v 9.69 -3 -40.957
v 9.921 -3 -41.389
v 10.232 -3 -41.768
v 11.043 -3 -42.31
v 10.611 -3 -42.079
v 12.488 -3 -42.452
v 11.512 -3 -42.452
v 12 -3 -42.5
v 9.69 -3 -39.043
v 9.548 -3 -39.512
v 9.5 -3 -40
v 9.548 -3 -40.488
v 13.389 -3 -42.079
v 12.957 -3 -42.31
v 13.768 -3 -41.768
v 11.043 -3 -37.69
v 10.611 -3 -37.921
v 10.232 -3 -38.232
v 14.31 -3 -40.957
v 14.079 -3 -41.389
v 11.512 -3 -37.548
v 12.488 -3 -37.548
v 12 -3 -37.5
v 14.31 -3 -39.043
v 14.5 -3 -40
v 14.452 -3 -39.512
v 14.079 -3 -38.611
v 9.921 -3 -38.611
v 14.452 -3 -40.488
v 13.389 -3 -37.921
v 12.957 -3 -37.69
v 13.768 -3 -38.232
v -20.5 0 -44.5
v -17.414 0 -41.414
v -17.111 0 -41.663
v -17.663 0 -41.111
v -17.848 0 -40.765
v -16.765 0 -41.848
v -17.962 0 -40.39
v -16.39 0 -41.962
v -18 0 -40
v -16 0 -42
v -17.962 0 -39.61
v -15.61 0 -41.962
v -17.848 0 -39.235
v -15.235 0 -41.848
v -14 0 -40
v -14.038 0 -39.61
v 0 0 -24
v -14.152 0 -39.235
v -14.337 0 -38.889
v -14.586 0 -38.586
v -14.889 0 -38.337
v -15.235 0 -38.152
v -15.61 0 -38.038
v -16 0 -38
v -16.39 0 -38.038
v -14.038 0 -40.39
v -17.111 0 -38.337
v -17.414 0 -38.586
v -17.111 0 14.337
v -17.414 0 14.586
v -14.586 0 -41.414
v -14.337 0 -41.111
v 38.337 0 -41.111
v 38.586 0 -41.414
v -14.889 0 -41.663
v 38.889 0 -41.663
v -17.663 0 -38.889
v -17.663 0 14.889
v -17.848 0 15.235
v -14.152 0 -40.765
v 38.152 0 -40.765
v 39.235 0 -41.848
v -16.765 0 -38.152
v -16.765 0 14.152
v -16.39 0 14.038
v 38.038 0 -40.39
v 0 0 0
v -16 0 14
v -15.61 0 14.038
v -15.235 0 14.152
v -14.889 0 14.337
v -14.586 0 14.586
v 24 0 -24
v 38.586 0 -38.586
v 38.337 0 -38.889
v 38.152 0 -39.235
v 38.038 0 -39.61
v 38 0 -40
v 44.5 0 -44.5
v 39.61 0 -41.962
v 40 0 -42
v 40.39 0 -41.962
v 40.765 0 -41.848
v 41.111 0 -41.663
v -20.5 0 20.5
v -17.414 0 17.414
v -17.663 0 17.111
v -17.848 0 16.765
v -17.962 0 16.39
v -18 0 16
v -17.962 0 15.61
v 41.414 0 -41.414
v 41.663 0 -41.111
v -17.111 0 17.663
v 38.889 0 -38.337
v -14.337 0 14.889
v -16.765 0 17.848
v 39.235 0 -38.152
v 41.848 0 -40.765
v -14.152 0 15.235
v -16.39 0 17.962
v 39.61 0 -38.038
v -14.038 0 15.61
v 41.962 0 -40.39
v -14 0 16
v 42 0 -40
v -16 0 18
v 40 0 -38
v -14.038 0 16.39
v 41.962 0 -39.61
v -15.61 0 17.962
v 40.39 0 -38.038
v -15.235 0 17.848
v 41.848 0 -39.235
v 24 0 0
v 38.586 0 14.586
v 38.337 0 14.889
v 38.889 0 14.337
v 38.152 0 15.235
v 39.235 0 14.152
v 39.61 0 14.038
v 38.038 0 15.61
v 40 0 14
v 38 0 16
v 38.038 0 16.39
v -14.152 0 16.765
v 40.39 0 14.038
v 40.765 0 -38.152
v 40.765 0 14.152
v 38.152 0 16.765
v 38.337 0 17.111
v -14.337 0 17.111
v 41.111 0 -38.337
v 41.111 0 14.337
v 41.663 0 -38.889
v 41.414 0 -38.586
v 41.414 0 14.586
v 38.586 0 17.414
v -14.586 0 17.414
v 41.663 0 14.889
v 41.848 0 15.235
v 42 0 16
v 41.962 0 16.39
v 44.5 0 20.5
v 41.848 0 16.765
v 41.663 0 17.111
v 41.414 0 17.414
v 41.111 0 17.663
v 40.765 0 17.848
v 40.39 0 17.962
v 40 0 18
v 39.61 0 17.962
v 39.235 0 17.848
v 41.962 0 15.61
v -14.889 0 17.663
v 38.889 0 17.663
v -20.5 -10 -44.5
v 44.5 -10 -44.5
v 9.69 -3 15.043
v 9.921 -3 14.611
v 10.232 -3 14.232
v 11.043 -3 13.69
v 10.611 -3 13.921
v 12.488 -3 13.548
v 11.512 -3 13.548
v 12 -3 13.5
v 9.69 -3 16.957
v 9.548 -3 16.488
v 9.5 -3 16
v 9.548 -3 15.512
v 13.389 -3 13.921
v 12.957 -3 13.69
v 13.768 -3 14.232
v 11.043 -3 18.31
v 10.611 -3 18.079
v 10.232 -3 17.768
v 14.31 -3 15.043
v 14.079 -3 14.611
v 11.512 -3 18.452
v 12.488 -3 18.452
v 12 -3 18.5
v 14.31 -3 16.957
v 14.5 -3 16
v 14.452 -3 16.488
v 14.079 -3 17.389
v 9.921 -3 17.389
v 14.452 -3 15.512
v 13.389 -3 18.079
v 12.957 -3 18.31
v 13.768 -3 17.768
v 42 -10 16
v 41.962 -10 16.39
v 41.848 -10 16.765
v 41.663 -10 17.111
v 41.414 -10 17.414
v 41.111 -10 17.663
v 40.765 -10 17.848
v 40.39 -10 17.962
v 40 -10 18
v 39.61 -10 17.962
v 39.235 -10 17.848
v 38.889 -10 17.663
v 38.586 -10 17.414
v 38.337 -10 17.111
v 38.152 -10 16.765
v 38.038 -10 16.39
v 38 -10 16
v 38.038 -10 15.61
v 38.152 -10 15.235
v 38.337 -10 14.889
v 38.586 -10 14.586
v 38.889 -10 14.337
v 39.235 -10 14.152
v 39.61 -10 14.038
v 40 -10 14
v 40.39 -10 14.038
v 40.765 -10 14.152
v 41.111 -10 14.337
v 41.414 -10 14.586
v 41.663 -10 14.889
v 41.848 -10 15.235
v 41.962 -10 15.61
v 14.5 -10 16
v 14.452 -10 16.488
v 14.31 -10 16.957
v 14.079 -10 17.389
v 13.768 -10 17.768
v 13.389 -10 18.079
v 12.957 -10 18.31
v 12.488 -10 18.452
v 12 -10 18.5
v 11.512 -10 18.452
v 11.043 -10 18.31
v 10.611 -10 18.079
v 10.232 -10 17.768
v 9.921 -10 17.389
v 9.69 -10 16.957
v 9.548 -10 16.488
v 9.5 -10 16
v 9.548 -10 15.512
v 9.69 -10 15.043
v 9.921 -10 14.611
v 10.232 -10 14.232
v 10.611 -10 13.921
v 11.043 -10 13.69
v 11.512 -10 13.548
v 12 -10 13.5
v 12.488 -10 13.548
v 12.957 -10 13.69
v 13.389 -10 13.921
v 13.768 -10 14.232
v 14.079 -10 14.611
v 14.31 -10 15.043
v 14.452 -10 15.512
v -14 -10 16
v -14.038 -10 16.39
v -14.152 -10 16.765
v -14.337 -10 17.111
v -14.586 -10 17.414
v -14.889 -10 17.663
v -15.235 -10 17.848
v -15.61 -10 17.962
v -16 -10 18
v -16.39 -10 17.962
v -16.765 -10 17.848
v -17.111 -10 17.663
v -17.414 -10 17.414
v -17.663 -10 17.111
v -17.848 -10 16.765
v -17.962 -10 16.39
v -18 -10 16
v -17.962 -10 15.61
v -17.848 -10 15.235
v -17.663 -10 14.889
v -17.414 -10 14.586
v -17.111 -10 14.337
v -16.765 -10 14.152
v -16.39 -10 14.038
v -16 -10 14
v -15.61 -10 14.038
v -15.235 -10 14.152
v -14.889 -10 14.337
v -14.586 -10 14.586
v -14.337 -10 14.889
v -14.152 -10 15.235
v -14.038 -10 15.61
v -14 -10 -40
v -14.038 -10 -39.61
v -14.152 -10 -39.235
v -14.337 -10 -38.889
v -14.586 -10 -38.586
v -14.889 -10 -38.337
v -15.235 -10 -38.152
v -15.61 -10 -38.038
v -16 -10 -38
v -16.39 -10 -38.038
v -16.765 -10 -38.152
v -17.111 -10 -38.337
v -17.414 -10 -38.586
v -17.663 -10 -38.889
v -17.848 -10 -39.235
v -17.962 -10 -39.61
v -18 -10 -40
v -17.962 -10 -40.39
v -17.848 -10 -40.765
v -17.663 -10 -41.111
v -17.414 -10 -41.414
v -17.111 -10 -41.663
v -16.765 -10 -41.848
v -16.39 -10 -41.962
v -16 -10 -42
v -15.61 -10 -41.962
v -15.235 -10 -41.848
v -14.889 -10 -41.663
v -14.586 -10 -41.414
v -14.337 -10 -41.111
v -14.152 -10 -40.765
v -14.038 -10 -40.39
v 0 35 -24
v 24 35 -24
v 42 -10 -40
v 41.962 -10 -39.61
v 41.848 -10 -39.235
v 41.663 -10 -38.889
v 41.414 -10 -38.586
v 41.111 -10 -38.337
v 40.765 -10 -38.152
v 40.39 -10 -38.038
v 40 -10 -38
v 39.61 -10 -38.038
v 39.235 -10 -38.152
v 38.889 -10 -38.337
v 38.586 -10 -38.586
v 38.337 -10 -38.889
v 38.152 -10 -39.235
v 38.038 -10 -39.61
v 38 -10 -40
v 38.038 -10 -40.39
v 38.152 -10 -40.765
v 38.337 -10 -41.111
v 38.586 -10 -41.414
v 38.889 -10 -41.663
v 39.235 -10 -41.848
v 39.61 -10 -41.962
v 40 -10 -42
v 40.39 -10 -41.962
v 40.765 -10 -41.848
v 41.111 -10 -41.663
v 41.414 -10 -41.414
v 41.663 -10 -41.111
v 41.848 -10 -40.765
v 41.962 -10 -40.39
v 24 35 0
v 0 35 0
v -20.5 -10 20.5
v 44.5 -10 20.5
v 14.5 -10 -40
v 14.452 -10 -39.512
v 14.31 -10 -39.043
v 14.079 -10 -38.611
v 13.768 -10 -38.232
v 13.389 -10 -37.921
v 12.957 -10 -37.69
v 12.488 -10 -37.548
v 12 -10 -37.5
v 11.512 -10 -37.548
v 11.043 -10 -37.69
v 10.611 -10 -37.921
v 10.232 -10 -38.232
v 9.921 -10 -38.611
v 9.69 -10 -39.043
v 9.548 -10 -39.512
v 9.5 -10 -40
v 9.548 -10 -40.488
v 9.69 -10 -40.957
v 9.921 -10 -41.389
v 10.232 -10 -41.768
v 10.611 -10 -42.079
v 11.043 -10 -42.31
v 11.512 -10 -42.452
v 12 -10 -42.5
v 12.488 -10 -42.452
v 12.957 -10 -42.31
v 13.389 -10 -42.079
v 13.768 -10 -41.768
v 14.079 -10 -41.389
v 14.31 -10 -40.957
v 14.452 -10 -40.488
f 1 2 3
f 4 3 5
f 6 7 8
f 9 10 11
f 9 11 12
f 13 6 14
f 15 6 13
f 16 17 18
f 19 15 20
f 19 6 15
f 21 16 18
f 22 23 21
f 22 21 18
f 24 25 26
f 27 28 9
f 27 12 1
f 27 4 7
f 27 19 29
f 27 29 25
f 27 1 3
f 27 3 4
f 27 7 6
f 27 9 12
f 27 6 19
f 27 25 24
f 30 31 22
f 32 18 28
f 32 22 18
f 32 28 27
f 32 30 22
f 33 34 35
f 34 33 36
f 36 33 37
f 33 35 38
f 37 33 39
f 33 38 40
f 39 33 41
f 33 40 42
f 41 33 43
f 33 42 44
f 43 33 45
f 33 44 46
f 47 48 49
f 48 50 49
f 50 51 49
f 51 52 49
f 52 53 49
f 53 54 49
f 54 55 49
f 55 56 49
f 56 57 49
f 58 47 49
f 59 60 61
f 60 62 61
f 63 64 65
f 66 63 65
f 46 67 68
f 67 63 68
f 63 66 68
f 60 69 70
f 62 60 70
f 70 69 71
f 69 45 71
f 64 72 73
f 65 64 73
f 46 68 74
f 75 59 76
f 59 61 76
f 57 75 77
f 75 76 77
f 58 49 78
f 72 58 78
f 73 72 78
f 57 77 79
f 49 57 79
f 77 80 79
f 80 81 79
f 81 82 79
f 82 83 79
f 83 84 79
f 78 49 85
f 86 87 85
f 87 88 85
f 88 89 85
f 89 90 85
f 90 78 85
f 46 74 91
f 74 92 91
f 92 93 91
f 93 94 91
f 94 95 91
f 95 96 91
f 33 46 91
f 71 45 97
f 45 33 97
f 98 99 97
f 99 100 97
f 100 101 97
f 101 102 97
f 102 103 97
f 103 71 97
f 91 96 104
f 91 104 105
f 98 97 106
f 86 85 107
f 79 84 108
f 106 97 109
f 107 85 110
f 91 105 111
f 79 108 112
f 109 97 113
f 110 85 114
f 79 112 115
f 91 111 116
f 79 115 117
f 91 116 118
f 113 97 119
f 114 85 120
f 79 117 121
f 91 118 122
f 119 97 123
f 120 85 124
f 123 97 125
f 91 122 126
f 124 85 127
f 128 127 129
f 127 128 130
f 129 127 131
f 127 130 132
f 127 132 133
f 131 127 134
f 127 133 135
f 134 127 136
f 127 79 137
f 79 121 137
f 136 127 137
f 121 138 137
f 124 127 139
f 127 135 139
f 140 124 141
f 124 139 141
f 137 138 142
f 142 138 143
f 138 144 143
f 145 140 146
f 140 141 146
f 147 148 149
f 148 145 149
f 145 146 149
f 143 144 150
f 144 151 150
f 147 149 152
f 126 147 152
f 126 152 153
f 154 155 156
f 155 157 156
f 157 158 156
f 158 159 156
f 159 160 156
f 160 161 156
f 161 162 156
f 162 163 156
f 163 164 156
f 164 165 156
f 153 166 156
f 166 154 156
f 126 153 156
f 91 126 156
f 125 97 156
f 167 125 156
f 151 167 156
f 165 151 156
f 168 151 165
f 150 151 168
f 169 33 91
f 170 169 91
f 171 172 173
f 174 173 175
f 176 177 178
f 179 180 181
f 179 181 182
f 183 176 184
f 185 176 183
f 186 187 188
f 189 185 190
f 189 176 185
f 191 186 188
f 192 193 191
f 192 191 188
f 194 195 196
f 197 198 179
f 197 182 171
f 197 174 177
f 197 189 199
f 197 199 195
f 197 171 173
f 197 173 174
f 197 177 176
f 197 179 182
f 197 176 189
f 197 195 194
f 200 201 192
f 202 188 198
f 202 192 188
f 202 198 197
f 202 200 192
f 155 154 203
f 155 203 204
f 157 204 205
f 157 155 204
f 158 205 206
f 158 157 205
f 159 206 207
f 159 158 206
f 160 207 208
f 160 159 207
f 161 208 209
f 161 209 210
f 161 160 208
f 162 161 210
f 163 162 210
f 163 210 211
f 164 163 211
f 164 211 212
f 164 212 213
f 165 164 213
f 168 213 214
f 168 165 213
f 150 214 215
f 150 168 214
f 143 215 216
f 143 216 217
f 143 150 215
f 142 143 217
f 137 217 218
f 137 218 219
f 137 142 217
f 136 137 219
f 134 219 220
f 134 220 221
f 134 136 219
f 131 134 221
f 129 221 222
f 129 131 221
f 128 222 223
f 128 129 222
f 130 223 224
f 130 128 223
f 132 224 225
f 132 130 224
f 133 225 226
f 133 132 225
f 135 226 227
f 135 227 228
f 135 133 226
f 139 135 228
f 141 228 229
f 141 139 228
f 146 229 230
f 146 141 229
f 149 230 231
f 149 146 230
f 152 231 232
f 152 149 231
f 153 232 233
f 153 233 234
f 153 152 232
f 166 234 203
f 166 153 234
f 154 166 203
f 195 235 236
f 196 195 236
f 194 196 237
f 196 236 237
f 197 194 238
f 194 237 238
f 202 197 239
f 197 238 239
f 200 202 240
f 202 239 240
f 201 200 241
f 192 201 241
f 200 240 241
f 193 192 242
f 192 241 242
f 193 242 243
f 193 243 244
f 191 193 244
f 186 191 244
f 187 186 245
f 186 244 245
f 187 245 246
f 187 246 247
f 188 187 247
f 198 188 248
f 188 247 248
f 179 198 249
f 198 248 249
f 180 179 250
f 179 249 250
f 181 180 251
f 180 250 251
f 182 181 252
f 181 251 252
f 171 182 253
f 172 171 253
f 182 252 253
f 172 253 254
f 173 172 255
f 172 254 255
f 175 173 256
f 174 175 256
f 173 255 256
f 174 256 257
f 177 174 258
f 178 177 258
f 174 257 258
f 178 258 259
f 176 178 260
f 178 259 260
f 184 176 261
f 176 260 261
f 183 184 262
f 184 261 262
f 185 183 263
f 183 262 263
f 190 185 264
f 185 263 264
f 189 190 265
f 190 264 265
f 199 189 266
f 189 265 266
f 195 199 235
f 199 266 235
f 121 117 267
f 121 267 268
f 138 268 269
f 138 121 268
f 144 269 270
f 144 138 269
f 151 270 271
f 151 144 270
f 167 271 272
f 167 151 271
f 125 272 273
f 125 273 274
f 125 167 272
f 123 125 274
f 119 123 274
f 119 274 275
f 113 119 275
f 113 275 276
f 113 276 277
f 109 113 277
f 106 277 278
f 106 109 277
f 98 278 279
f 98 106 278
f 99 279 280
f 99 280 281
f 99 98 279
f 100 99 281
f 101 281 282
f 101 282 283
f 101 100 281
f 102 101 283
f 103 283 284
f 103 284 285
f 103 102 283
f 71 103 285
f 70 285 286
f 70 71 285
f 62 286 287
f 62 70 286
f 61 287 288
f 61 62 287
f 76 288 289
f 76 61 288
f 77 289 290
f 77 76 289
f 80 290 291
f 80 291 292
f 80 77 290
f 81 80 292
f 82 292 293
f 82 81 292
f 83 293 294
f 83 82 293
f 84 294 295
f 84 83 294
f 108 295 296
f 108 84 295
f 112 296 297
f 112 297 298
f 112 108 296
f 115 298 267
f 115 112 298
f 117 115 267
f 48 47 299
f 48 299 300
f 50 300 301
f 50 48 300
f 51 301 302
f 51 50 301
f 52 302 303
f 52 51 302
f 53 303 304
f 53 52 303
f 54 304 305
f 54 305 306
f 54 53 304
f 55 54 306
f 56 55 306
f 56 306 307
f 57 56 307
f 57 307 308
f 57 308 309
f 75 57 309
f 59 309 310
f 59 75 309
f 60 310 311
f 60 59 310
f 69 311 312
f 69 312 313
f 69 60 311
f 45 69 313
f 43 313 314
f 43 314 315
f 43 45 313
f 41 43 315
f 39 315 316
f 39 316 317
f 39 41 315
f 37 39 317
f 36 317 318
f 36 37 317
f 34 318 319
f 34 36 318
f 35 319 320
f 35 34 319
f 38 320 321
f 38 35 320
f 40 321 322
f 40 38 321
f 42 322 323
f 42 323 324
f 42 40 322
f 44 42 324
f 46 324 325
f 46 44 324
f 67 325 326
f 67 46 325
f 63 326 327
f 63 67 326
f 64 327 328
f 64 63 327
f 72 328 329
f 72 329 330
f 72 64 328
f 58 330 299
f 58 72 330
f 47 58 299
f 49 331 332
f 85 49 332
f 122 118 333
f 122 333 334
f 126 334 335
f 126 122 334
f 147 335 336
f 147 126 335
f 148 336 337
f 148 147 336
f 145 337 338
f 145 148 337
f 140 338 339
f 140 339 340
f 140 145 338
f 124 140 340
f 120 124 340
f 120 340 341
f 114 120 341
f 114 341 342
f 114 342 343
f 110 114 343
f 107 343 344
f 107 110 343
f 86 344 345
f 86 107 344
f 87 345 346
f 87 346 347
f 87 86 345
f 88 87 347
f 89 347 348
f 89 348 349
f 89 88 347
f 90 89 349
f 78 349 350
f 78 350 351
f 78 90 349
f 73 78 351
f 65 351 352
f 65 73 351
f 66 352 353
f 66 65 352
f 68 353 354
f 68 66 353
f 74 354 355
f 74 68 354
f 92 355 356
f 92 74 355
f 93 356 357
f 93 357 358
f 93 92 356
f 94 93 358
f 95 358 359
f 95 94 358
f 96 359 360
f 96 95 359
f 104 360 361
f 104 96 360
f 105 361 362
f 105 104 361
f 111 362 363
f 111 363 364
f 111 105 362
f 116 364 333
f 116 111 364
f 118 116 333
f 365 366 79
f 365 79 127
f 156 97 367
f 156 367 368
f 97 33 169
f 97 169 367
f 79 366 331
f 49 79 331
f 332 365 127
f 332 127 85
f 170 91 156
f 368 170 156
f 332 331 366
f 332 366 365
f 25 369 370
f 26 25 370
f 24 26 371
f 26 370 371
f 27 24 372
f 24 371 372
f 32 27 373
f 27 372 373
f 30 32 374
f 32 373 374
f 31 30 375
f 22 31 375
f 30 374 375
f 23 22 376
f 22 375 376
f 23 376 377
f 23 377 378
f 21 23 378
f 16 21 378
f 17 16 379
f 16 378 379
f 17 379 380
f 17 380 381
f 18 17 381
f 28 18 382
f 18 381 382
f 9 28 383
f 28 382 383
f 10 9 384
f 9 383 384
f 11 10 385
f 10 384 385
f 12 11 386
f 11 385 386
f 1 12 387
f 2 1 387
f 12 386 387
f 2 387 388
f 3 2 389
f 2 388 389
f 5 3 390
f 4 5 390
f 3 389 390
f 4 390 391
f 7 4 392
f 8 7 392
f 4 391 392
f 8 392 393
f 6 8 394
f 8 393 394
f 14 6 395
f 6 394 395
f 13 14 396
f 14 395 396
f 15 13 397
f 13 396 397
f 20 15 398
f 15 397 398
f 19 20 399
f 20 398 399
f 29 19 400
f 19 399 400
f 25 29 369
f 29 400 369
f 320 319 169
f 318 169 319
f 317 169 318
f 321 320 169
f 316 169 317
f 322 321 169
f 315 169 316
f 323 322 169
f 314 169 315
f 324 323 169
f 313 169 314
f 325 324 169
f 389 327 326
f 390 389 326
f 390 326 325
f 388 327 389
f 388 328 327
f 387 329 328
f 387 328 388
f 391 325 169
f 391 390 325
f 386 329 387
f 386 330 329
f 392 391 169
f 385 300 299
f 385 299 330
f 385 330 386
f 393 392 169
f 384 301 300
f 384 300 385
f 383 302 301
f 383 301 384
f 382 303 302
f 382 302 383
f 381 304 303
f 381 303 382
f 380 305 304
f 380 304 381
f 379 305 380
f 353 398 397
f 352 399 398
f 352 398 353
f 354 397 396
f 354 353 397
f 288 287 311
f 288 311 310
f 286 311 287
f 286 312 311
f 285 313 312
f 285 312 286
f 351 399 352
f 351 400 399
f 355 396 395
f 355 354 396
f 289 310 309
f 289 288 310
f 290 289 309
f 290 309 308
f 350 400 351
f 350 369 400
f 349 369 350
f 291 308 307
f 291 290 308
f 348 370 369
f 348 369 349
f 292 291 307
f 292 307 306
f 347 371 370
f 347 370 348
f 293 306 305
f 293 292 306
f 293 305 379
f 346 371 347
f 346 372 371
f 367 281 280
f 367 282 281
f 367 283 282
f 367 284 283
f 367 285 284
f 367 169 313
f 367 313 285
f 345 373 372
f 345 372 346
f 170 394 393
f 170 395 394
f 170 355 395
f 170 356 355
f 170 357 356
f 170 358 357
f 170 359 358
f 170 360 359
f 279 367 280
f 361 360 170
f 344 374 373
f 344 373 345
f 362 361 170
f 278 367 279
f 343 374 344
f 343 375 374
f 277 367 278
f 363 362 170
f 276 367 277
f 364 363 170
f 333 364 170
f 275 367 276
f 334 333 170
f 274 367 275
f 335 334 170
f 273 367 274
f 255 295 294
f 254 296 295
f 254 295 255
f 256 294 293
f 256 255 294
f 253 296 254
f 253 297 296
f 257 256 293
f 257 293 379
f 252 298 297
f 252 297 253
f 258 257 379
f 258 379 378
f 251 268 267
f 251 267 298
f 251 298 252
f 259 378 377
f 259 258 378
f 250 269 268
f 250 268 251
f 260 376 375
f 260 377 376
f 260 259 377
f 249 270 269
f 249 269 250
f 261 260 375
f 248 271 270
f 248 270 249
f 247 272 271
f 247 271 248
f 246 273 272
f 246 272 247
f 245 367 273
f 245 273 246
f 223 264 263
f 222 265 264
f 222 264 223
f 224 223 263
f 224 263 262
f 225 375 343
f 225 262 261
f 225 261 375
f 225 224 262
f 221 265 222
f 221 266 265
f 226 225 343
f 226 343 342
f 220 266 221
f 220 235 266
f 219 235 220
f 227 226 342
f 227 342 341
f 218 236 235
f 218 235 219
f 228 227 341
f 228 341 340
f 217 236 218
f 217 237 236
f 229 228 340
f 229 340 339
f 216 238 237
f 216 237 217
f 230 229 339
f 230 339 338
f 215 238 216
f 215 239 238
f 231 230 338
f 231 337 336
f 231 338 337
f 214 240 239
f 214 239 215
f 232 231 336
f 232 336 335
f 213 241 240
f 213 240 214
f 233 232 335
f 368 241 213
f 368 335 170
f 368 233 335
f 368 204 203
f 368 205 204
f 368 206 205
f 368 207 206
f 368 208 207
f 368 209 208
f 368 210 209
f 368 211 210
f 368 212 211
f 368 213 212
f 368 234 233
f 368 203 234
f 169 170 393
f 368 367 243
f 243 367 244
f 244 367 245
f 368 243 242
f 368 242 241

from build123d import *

# Parameters (mm, degrees)
SKETCH1_W           = 24
SKETCH1_H           = 24
BOSS_EXTRUDE1_DEPTH = 35
SKETCH2_W           = 65
SKETCH2_H           = 65
SKETCH2_R           = 2
BOSS_EXTRUDE2_DEPTH = 10
SKETCH3_R           = 2.5
CUT_EXTRUDE1_DEPTH  = 7


with BuildPart() as part:
    # Sketch1 → Boss-Extrude1 (new body)
    with BuildSketch(Plane(origin=(0, 0, 0), x_dir=(1, 0, 0), z_dir=(0, 1, 0))):
        with Locations((12, 12)):
            Rectangle(SKETCH1_W, SKETCH1_H)
    extrude(amount=BOSS_EXTRUDE1_DEPTH)

    # Sketch2 → Boss-Extrude2 (add)
    with BuildSketch(Plane.XZ):
        with Locations((12, -12)):
            Rectangle(SKETCH2_W, SKETCH2_H)
        with Locations((-16, 16)):
            Circle(SKETCH2_R, mode=Mode.SUBTRACT)
        with Locations((-16, -40)):
            Circle(SKETCH2_R, mode=Mode.SUBTRACT)
        with Locations((40, 16)):
            Circle(SKETCH2_R, mode=Mode.SUBTRACT)
        with Locations((40, -40)):
            Circle(SKETCH2_R, mode=Mode.SUBTRACT)
    extrude(amount=BOSS_EXTRUDE2_DEPTH)

    # Sketch3 → Cut-Extrude1 (cut)
    with BuildSketch(Plane.XZ.offset(10)):
        with Locations((12, 16)):
            Circle(SKETCH3_R)
        with Locations((12, -40)):
            Circle(SKETCH3_R)
    extrude(amount=-CUT_EXTRUDE1_DEPTH, mode=Mode.SUBTRACT)


solid = part.part
